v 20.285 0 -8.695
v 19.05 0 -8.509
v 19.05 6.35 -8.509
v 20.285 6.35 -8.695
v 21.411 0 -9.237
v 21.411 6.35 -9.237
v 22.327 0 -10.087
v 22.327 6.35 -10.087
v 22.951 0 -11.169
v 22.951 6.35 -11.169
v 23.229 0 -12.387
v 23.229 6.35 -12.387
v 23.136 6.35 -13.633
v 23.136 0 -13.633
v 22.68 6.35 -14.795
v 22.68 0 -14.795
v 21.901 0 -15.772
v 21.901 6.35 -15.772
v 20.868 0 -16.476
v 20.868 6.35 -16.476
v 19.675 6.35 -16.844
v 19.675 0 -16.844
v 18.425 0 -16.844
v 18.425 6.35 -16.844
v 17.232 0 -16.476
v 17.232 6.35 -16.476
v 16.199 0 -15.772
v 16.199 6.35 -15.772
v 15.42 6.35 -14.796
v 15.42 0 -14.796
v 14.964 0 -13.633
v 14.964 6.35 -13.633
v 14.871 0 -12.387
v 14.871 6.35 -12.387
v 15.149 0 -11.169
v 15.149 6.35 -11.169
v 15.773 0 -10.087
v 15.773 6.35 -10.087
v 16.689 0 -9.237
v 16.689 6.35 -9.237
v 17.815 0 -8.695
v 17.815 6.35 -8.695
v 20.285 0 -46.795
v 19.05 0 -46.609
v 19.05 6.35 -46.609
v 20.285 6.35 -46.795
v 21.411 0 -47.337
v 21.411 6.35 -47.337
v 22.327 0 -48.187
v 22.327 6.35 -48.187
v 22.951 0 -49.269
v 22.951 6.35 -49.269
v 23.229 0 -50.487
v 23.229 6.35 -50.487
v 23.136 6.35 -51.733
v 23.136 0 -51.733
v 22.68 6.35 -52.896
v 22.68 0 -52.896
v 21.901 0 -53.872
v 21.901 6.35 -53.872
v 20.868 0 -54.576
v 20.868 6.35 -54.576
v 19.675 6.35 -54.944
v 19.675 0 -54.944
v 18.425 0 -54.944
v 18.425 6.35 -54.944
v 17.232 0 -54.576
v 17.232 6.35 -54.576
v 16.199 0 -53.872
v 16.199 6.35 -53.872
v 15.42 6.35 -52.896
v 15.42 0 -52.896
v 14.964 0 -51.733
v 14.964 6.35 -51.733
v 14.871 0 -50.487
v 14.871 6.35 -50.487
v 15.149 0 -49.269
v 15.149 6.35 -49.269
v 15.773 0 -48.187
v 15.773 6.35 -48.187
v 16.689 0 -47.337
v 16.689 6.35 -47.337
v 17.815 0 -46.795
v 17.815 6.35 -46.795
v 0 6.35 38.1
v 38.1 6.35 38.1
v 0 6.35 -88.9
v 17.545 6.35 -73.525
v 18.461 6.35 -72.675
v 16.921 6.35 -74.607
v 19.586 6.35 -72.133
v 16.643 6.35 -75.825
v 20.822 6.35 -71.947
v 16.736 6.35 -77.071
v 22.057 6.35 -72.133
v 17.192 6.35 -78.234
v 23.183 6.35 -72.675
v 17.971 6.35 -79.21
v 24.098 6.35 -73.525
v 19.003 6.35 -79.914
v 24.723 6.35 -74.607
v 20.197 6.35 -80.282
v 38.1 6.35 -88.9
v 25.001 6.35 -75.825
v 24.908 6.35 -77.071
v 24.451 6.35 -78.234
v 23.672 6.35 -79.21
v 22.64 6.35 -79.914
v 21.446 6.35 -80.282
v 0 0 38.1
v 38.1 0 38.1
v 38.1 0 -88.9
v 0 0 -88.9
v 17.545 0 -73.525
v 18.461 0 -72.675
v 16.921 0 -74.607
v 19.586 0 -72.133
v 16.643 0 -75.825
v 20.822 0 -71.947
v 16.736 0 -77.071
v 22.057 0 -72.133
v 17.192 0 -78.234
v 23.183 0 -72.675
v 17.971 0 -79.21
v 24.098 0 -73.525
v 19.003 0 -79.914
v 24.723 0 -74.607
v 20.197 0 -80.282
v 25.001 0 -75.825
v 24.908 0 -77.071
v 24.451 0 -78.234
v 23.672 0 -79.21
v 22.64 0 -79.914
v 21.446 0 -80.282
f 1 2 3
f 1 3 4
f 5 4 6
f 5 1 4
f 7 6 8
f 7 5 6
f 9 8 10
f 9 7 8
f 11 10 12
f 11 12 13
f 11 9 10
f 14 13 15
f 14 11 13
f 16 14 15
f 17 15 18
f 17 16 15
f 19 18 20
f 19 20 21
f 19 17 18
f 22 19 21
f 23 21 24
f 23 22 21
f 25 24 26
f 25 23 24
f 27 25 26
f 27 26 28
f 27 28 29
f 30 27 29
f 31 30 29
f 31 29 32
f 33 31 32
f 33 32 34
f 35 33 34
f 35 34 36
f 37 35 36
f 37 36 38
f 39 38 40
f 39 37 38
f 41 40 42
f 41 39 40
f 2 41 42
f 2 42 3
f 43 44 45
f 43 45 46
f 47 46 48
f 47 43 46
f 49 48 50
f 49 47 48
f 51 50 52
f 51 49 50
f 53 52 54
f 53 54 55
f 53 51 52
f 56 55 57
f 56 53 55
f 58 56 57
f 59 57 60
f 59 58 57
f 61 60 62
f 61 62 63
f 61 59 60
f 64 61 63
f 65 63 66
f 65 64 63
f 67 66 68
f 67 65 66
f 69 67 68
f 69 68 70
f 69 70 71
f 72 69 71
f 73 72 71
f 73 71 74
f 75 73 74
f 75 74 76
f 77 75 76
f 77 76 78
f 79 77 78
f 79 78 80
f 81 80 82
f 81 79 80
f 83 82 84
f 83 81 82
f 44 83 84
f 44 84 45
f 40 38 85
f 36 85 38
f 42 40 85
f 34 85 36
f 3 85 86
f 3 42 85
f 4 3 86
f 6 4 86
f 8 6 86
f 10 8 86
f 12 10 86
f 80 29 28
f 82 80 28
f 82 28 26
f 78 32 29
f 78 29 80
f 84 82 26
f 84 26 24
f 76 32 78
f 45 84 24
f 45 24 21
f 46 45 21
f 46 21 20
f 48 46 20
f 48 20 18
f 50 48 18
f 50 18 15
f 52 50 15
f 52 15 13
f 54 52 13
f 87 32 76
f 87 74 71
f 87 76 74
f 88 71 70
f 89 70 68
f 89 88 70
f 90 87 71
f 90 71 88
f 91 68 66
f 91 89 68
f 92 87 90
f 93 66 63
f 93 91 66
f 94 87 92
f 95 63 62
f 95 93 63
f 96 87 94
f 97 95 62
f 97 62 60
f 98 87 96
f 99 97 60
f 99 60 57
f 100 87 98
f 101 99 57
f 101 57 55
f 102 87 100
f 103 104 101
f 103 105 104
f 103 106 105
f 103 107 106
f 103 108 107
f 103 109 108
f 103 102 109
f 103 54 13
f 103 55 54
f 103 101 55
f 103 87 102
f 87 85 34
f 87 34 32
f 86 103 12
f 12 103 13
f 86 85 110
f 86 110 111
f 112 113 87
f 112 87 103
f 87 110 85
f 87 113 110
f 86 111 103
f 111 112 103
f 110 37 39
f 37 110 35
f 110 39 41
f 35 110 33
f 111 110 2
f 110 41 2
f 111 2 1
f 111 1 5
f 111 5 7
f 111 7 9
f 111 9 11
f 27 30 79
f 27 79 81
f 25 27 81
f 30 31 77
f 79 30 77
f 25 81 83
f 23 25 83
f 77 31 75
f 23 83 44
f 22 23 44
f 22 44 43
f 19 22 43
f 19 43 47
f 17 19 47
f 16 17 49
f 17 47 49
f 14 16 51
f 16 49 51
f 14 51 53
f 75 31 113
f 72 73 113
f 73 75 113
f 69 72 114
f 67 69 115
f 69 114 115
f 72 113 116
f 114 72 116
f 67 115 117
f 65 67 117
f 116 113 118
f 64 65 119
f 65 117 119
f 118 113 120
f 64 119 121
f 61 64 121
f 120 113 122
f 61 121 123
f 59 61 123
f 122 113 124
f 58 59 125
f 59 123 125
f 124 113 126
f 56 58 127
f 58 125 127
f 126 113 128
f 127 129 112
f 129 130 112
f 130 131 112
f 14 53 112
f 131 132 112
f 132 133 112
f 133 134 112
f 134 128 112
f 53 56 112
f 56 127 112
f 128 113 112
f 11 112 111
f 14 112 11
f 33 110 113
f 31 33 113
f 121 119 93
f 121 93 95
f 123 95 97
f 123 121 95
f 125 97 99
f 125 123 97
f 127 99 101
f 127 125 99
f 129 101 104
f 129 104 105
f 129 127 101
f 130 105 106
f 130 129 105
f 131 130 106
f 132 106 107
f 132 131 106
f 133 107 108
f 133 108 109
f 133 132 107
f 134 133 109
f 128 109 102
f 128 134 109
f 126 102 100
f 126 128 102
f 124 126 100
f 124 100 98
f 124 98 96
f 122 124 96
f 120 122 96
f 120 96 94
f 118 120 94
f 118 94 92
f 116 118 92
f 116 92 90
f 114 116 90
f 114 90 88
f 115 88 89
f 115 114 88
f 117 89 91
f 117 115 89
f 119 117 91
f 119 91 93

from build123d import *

# Parameters (mm, degrees)
SKETCH1_W           = 38.1
SKETCH1_H           = 88.9
SKETCH1_R           = 4.191
BOSS_EXTRUDE1_DEPTH = 6.35
SKETCH3_W           = 38.1
SKETCH3_H           = 6.35
BOSS_EXTRUDE2_DEPTH = 38.1


with BuildPart() as part:
    # Sketch1 → Boss-Extrude1 (new body)
    with BuildSketch(Plane(origin=(0, 0, 0), x_dir=(1, 0, 0), z_dir=(0, 1, 0))):
        with Locations((19.05, 44.45)):
            Rectangle(SKETCH1_W, SKETCH1_H)
        with Locations(Location((19.05, 12.7, 0), (0, 0, 270))):
            Circle(SKETCH1_R, mode=Mode.SUBTRACT)
        with Locations(Location((19.05, 50.8, 0), (0, 0, 270))):
            Circle(SKETCH1_R, mode=Mode.SUBTRACT)
        with Locations(Location((20.821814433, 76.138126877, 0), (0, 0, 270))):
            Circle(SKETCH1_R, mode=Mode.SUBTRACT)
    extrude(amount=BOSS_EXTRUDE1_DEPTH)

    # Sketch3 → Boss-Extrude2 (add)
    with BuildSketch(Plane.XY):
        with Locations((19.05, 3.175)):
            Rectangle(SKETCH3_W, SKETCH3_H)
    extrude(amount=BOSS_EXTRUDE2_DEPTH)


solid = part.part
